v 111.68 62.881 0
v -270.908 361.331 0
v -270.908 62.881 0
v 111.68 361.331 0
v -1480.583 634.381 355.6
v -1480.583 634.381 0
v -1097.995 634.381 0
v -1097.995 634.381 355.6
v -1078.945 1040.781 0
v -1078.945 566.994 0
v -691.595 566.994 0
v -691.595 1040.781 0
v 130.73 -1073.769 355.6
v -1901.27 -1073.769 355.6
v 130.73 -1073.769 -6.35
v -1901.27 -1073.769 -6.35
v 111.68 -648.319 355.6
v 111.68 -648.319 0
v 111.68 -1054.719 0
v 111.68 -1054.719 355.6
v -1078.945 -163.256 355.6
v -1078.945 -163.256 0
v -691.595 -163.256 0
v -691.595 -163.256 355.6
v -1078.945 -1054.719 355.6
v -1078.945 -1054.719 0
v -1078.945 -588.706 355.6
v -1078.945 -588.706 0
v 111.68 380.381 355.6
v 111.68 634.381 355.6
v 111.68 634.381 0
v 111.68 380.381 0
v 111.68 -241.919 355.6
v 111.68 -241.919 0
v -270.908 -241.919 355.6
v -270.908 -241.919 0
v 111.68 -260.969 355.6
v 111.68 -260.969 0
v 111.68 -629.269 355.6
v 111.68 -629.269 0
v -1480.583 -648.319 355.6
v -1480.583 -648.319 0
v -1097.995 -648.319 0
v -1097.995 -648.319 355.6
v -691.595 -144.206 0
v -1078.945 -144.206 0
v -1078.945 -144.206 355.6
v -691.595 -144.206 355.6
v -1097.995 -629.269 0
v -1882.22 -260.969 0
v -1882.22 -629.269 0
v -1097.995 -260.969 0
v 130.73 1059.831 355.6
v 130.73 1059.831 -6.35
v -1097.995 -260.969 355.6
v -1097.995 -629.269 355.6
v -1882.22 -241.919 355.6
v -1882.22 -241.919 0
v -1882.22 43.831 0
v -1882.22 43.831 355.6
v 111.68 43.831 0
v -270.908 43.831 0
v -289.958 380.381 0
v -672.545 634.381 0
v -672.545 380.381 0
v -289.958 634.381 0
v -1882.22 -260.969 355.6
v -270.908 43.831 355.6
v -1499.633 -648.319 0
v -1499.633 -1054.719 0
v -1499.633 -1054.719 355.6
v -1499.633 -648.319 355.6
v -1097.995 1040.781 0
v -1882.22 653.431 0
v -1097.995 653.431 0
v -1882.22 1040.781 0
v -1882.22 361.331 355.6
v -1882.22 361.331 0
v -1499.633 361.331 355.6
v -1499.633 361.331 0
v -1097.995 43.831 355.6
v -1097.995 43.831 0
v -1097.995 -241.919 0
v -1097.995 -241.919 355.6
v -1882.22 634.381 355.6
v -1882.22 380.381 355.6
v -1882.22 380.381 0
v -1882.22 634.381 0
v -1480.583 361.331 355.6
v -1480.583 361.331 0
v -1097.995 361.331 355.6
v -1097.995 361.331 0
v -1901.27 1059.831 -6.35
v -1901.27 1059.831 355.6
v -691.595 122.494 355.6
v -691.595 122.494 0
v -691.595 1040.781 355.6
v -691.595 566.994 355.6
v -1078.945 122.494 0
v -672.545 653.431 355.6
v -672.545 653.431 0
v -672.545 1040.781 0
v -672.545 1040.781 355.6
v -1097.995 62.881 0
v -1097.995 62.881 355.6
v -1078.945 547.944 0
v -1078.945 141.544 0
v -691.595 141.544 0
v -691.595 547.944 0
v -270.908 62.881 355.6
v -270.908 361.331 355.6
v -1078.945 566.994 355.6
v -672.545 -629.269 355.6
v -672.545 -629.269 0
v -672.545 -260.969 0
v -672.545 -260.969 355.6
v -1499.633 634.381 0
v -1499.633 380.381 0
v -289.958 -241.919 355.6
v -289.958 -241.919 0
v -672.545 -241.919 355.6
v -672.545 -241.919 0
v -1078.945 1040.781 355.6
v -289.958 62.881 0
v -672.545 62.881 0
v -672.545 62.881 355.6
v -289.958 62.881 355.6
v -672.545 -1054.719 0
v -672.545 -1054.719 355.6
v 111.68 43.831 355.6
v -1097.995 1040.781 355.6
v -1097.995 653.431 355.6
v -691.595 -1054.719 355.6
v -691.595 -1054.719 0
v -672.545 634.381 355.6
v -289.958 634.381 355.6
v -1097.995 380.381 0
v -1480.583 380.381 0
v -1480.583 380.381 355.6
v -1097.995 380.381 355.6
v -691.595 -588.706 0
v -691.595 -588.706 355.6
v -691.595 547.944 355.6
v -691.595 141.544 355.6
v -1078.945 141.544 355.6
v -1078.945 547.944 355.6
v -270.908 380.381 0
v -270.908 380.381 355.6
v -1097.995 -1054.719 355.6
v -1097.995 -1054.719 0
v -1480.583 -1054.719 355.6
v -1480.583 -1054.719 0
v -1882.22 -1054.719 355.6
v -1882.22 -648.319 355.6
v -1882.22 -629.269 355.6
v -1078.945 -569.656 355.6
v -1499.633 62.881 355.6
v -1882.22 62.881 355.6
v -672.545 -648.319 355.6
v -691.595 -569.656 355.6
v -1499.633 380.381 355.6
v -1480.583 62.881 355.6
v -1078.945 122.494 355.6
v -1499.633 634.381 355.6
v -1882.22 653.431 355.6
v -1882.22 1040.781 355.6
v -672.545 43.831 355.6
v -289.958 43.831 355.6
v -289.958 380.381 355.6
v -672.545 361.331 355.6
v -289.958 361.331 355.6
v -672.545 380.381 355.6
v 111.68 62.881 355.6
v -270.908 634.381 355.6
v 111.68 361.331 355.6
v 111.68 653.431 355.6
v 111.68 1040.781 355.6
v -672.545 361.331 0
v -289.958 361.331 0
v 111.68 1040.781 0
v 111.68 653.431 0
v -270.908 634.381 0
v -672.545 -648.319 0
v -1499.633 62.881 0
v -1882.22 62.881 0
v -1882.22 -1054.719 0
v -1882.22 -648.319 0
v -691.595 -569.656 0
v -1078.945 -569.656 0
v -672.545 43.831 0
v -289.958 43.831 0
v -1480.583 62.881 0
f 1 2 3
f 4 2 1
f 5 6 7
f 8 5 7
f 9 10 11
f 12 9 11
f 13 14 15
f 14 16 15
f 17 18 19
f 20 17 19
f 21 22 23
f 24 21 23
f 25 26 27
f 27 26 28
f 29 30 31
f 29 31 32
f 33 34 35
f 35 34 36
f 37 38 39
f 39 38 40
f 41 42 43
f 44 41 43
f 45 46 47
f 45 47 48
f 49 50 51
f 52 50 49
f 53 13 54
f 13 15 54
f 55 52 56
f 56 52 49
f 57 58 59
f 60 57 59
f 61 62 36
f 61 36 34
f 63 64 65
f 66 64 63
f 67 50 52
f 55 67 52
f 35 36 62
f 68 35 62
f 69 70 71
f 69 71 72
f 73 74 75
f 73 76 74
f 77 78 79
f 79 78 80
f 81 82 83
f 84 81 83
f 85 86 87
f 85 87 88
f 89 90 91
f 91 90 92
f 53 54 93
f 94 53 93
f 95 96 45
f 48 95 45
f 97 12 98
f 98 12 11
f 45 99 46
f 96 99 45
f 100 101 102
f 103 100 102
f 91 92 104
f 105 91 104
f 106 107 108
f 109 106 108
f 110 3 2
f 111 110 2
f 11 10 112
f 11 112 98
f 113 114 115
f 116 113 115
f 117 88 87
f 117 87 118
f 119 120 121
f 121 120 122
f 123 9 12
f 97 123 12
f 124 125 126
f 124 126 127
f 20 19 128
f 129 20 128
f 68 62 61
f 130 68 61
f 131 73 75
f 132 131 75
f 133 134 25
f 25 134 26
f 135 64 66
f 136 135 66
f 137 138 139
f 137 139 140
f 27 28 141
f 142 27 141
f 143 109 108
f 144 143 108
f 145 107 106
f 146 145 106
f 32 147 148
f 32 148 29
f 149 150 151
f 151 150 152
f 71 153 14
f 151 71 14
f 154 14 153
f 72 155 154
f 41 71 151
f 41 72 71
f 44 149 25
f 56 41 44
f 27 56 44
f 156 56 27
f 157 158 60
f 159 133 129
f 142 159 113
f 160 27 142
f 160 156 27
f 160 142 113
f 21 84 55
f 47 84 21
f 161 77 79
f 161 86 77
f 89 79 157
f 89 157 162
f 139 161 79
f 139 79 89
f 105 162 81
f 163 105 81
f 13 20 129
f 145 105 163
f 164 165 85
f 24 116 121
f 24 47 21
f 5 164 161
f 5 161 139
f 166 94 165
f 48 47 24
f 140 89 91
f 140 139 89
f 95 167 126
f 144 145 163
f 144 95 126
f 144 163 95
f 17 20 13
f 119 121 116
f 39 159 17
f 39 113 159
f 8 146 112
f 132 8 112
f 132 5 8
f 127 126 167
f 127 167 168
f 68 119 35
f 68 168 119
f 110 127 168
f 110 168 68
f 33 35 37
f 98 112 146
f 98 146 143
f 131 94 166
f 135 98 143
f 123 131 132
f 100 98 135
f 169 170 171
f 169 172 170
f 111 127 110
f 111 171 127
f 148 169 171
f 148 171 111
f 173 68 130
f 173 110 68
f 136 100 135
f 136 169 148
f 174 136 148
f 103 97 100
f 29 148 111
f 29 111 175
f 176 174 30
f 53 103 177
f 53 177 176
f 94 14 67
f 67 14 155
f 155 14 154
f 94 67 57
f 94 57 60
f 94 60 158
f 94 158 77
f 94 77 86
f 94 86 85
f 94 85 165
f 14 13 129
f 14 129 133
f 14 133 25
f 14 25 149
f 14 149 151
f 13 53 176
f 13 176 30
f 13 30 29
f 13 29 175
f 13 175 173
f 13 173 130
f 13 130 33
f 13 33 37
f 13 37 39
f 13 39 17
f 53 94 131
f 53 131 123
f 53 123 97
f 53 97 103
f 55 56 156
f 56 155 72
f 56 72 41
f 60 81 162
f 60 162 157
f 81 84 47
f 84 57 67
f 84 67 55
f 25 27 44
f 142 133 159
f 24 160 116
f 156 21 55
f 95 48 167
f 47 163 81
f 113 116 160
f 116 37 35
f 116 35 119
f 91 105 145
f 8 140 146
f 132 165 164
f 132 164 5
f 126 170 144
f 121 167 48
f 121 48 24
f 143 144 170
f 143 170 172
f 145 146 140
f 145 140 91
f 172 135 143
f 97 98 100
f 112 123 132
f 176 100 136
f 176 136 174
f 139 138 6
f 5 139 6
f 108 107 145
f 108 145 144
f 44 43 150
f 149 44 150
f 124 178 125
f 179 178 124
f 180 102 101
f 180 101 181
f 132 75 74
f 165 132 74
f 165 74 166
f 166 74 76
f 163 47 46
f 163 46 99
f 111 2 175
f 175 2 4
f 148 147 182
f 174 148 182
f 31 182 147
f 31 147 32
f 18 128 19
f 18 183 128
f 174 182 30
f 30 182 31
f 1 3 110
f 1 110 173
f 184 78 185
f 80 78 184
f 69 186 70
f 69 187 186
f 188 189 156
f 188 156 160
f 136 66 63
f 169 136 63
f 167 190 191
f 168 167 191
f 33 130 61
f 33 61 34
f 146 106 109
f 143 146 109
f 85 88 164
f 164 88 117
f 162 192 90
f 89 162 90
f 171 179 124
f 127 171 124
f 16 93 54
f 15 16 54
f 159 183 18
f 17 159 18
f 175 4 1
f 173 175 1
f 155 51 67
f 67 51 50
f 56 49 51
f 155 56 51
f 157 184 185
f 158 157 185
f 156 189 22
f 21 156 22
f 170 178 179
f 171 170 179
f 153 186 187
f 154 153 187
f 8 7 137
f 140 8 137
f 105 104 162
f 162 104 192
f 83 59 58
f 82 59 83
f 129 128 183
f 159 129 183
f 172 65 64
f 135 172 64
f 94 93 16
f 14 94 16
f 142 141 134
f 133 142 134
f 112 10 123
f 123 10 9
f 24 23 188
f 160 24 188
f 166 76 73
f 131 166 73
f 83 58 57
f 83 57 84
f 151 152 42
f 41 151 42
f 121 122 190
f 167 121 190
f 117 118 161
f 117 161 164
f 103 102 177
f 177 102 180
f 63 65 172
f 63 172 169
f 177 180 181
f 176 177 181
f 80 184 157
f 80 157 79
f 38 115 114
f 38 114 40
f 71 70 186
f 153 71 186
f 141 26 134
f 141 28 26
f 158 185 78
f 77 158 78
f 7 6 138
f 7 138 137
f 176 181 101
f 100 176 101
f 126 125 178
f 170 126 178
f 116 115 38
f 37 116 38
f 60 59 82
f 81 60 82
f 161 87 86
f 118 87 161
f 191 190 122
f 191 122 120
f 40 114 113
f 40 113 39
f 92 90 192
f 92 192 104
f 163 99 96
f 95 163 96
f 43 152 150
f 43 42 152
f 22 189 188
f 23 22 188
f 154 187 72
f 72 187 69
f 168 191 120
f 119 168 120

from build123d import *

# Parameters (mm, degrees)
F0_W     = 784.225
F0_H     = 387.35
F0_W_2   = 382.5875
F0_H_2   = 406.4
F0_H_3   = 254
F0_W_3   = 387.35
F0_H_4   = 473.7870542765
F0_W_4   = 19.05
F0_H_5   = 19.05
F0_H_6   = 368.3
F0_H_7   = 298.45
F0_H_8   = 466.0129457235
F0_H_9   = 285.75
F0_H_10  = 266.7
F1_DEPTH = 6.35
F2_DEPTH = 355.6


with BuildPart() as f1:
    # F0 (on Top) → F1 (new body)
    with BuildSketch(Plane.XY):
        Polygon((-1882.2203393722, 1059.8308014154), (-1901.2703393722, 1059.8308014154), (-1901.2703393722, -1073.7691985846), (-1882.2203393722, -1073.7691985846), (-1882.2203393722, -1054.7191985846), (-1882.2203393722, -648.3191985846), (-1882.2203393722, -629.2691985846), (-1882.2203393722, -260.9691985846), (-1882.2203393722, -241.9191985846), (-1882.2203393722, 43.8308014154), (-1882.2203393722, 62.8808014154), (-1882.2203393722, 361.3308014154), (-1882.2203393722, 380.3808014154), (-1882.2203393722, 634.3808014154), (-1882.2203393722, 653.4308014154), (-1882.2203393722, 1040.7808014154), align=None)
        Polygon((-682.0703393722, 1059.8308014154), (-1882.2203393722, 1059.8308014154), (-1882.2203393722, 1040.7808014154), (-1097.9953393722, 1040.7808014154), (-1078.9453393722, 1040.7808014154), (-691.5953393722, 1040.7808014154), (-672.5453393722, 1040.7808014154), (111.6796606278, 1040.7808014154), (111.6796606278, 1059.8308014154), align=None)
        with Locations((-1490.1078393722, 847.1058014154)):
            Rectangle(F0_W, F0_H)
        Polygon((-1882.2203393722, -1054.7191985846), (-1882.2203393722, -1073.7691985846), (111.6796606278, -1073.7691985846), (111.6796606278, -1054.7191985846), (-672.5453393722, -1054.7191985846), (-691.5953393722, -1054.7191985846), (-1078.9453393722, -1054.7191985846), (-1097.9953393722, -1054.7191985846), (-1480.5828393722, -1054.7191985846), (-1499.6328393722, -1054.7191985846), align=None)
        Polygon((130.7296606278, 1059.8308014154), (111.6796606278, 1059.8308014154), (111.6796606278, 1040.7808014154), (111.6796606278, 653.4308014154), (111.6796606278, 634.3808014154), (111.6796606278, 380.3808014154), (111.6796606278, 361.3308014154), (111.6796606278, 62.8808014154), (111.6796606278, 43.8308014154), (111.6796606278, -241.9191985846), (111.6796606278, -260.9691985846), (111.6796606278, -629.2691985846), (111.6796606278, -648.3191985846), (111.6796606278, -1054.7191985846), (111.6796606278, -1073.7691985846), (130.7296606278, -1073.7691985846), align=None)
        Polygon((-1097.9953393722, 653.4308014154), (-1882.2203393722, 653.4308014154), (-1882.2203393722, 634.3808014154), (-1499.6328393722, 634.3808014154), (-1480.5828393722, 634.3808014154), (-1097.9953393722, 634.3808014154), align=None)
        Polygon((-1078.9453393722, 1040.7808014154), (-1097.9953393722, 1040.7808014154), (-1097.9953393722, 653.4308014154), (-1097.9953393722, 634.3808014154), (-1097.9953393722, 380.3808014154), (-1097.9953393722, 361.3308014154), (-1097.9953393722, 62.8808014154), (-1097.9953393722, 43.8308014154), (-1097.9953393722, -241.9191985846), (-1097.9953393722, -260.9691985846), (-1097.9953393722, -629.2691985846), (-1097.9953393722, -648.3191985846), (-1097.9953393722, -1054.7191985846), (-1078.9453393722, -1054.7191985846), (-1078.9453393722, -588.706252861), (-1078.9453393722, -569.656252861), (-1078.9453393722, -163.256252861), (-1078.9453393722, -144.206252861), (-1078.9453393722, 122.493747139), (-1078.9453393722, 141.543747139), (-1078.9453393722, 547.943747139), (-1078.9453393722, 566.993747139), align=None)
        with Locations((-1690.9265893722, -851.5191985846)):
            Rectangle(F0_W_2, F0_H_2)
        with Locations((-280.4328393722, 847.1058014154)):
            Rectangle(F0_W, F0_H)
        with Locations((-1690.9265893722, 507.3808014154)):
            Rectangle(F0_W_2, F0_H_3)
        with Locations((-885.2703393722, 803.8872742772)):
            Rectangle(F0_W_3, F0_H_4)
        with Locations((-280.4328393722, -851.5191985846)):
            Rectangle(F0_W, F0_H_2)
        Polygon((-1882.2203393722, -629.2691985846), (-1882.2203393722, -648.3191985846), (-1499.6328393722, -648.3191985846), (-1480.5828393722, -648.3191985846), (-1097.9953393722, -648.3191985846), (-1097.9953393722, -629.2691985846), align=None)
        with Locations((-1490.1078393722, -851.5191985846)):
            Rectangle(F0_W_4, F0_H_2)
        Polygon((111.6796606278, 634.3808014154), (111.6796606278, 653.4308014154), (-672.5453393722, 653.4308014154), (-672.5453393722, 634.3808014154), (-289.9578393722, 634.3808014154), (-270.9078393722, 634.3808014154), align=None)
        Polygon((-672.5453393722, 653.4308014154), (-672.5453393722, 1040.7808014154), (-691.5953393722, 1040.7808014154), (-691.5953393722, 566.993747139), (-691.5953393722, 547.943747139), (-691.5953393722, 141.543747139), (-691.5953393722, 122.493747139), (-691.5953393722, -144.206252861), (-691.5953393722, -163.256252861), (-691.5953393722, -569.656252861), (-691.5953393722, -588.706252861), (-691.5953393722, -1054.7191985846), (-672.5453393722, -1054.7191985846), (-672.5453393722, -648.3191985846), (-672.5453393722, -629.2691985846), (-672.5453393722, -260.9691985846), (-672.5453393722, -241.9191985846), (-672.5453393722, 43.8308014154), (-672.5453393722, 62.8808014154), (-672.5453393722, 361.3308014154), (-672.5453393722, 380.3808014154), (-672.5453393722, 634.3808014154), align=None)
        with Locations((-1690.9265893722, 370.8558014154)):
            Rectangle(F0_W_2, F0_H_5)
        with Locations((-1490.1078393722, 507.3808014154)):
            Rectangle(F0_W_4, F0_H_3)
        with Locations((-1289.2890893722, 507.3808014154)):
            Rectangle(F0_W_2, F0_H_3)
        with Locations((-885.2703393722, 557.468747139)):
            Rectangle(F0_W_3, F0_H_5)
        with Locations((-280.4328393722, -638.7941985846)):
            Rectangle(F0_W, F0_H_5)
        with Locations((-1490.1078393722, -445.1191985846)):
            Rectangle(F0_W, F0_H_6)
        with Locations((-1289.2890893722, -851.5191985846)):
            Rectangle(F0_W_2, F0_H_2)
        with Locations((-79.6140893722, 507.3808014154)):
            Rectangle(F0_W_2, F0_H_3)
        with Locations((-1690.9265893722, 212.1058014154)):
            Rectangle(F0_W_2, F0_H_7)
        with Locations((-1490.1078393722, 370.8558014154)):
            Rectangle(F0_W_4, F0_H_5)
        with Locations((-1289.2890893722, 370.8558014154)):
            Rectangle(F0_W_2, F0_H_5)
        with Locations((-885.2703393722, 344.743747139)):
            Rectangle(F0_W_3, F0_H_2)
        with Locations((-280.4328393722, -445.1191985846)):
            Rectangle(F0_W, F0_H_6)
        with Locations((-885.2703393722, -821.7127257228)):
            Rectangle(F0_W_3, F0_H_8)
        with Locations((-1490.1078393722, -251.4441985846)):
            Rectangle(F0_W, F0_H_5)
        with Locations((-79.6140893722, 370.8558014154)):
            Rectangle(F0_W_2, F0_H_5)
        with Locations((-280.4328393722, 507.3808014154)):
            Rectangle(F0_W_4, F0_H_3)
        with Locations((-481.2515893722, 507.3808014154)):
            Rectangle(F0_W_2, F0_H_3)
        Polygon((-1499.6328393722, 62.8808014154), (-1882.2203393722, 62.8808014154), (-1882.2203393722, 43.8308014154), (-1097.9953393722, 43.8308014154), (-1097.9953393722, 62.8808014154), (-1480.5828393722, 62.8808014154), align=None)
        with Locations((-1490.1078393722, 212.1058014154)):
            Rectangle(F0_W_4, F0_H_7)
        with Locations((-1289.2890893722, 212.1058014154)):
            Rectangle(F0_W_2, F0_H_7)
        with Locations((-885.2703393722, 132.018747139)):
            Rectangle(F0_W_3, F0_H_5)
        Polygon((-672.5453393722, -260.9691985846), (111.6796606278, -260.9691985846), (111.6796606278, -241.9191985846), (-270.9078393722, -241.9191985846), (-289.9578393722, -241.9191985846), (-672.5453393722, -241.9191985846), align=None)
        with Locations((-885.2703393722, -579.181252861)):
            Rectangle(F0_W_3, F0_H_5)
        with Locations((-1490.1078393722, -99.0441985846)):
            Rectangle(F0_W, F0_H_9)
        with Locations((-79.6140893722, 212.1058014154)):
            Rectangle(F0_W_2, F0_H_7)
        with Locations((-280.4328393722, 370.8558014154)):
            Rectangle(F0_W_4, F0_H_5)
        with Locations((-481.2515893722, 370.8558014154)):
            Rectangle(F0_W_2, F0_H_5)
        with Locations((-885.2703393722, -10.856252861)):
            Rectangle(F0_W_3, F0_H_10)
        with Locations((-79.6140893722, -99.0441985846)):
            Rectangle(F0_W_2, F0_H_9)
        with Locations((-885.2703393722, -366.456252861)):
            Rectangle(F0_W_3, F0_H_2)
        with Locations((-79.6140893722, 53.3558014154)):
            Rectangle(F0_W_2, F0_H_5)
        with Locations((-280.4328393722, 212.1058014154)):
            Rectangle(F0_W_4, F0_H_7)
        with Locations((-481.2515893722, 212.1058014154)):
            Rectangle(F0_W_2, F0_H_7)
        with Locations((-885.2703393722, -153.731252861)):
            Rectangle(F0_W_3, F0_H_5)
        with Locations((-280.4328393722, -99.0441985846)):
            Rectangle(F0_W_4, F0_H_9)
        with Locations((-481.2515893722, -99.0441985846)):
            Rectangle(F0_W_2, F0_H_9)
        with Locations((-280.4328393722, 53.3558014154)):
            Rectangle(F0_W_4, F0_H_5)
        with Locations((-481.2515893722, 53.3558014154)):
            Rectangle(F0_W_2, F0_H_5)
    extrude(amount=-F1_DEPTH)

    # F0 (on Top) → F2 (join)
    with BuildSketch(Plane.XY):
        Polygon((-1882.2203393722, 1059.8308014154), (-1901.2703393722, 1059.8308014154), (-1901.2703393722, -1073.7691985846), (-1882.2203393722, -1073.7691985846), (-1882.2203393722, -1054.7191985846), (-1882.2203393722, -648.3191985846), (-1882.2203393722, -629.2691985846), (-1882.2203393722, -260.9691985846), (-1882.2203393722, -241.9191985846), (-1882.2203393722, 43.8308014154), (-1882.2203393722, 62.8808014154), (-1882.2203393722, 361.3308014154), (-1882.2203393722, 380.3808014154), (-1882.2203393722, 634.3808014154), (-1882.2203393722, 653.4308014154), (-1882.2203393722, 1040.7808014154), align=None)
        Polygon((-682.0703393722, 1059.8308014154), (-1882.2203393722, 1059.8308014154), (-1882.2203393722, 1040.7808014154), (-1097.9953393722, 1040.7808014154), (-1078.9453393722, 1040.7808014154), (-691.5953393722, 1040.7808014154), (-672.5453393722, 1040.7808014154), (111.6796606278, 1040.7808014154), (111.6796606278, 1059.8308014154), align=None)
        Polygon((-1882.2203393722, -1054.7191985846), (-1882.2203393722, -1073.7691985846), (111.6796606278, -1073.7691985846), (111.6796606278, -1054.7191985846), (-672.5453393722, -1054.7191985846), (-691.5953393722, -1054.7191985846), (-1078.9453393722, -1054.7191985846), (-1097.9953393722, -1054.7191985846), (-1480.5828393722, -1054.7191985846), (-1499.6328393722, -1054.7191985846), align=None)
        Polygon((130.7296606278, 1059.8308014154), (111.6796606278, 1059.8308014154), (111.6796606278, 1040.7808014154), (111.6796606278, 653.4308014154), (111.6796606278, 634.3808014154), (111.6796606278, 380.3808014154), (111.6796606278, 361.3308014154), (111.6796606278, 62.8808014154), (111.6796606278, 43.8308014154), (111.6796606278, -241.9191985846), (111.6796606278, -260.9691985846), (111.6796606278, -629.2691985846), (111.6796606278, -648.3191985846), (111.6796606278, -1054.7191985846), (111.6796606278, -1073.7691985846), (130.7296606278, -1073.7691985846), align=None)
        Polygon((-1097.9953393722, 653.4308014154), (-1882.2203393722, 653.4308014154), (-1882.2203393722, 634.3808014154), (-1499.6328393722, 634.3808014154), (-1480.5828393722, 634.3808014154), (-1097.9953393722, 634.3808014154), align=None)
        Polygon((-1078.9453393722, 1040.7808014154), (-1097.9953393722, 1040.7808014154), (-1097.9953393722, 653.4308014154), (-1097.9953393722, 634.3808014154), (-1097.9953393722, 380.3808014154), (-1097.9953393722, 361.3308014154), (-1097.9953393722, 62.8808014154), (-1097.9953393722, 43.8308014154), (-1097.9953393722, -241.9191985846), (-1097.9953393722, -260.9691985846), (-1097.9953393722, -629.2691985846), (-1097.9953393722, -648.3191985846), (-1097.9953393722, -1054.7191985846), (-1078.9453393722, -1054.7191985846), (-1078.9453393722, -588.706252861), (-1078.9453393722, -569.656252861), (-1078.9453393722, -163.256252861), (-1078.9453393722, -144.206252861), (-1078.9453393722, 122.493747139), (-1078.9453393722, 141.543747139), (-1078.9453393722, 547.943747139), (-1078.9453393722, 566.993747139), align=None)
        Polygon((-1882.2203393722, -629.2691985846), (-1882.2203393722, -648.3191985846), (-1499.6328393722, -648.3191985846), (-1480.5828393722, -648.3191985846), (-1097.9953393722, -648.3191985846), (-1097.9953393722, -629.2691985846), align=None)
        with Locations((-1490.1078393722, -851.5191985846)):
            Rectangle(F0_W_4, F0_H_2)
        Polygon((111.6796606278, 634.3808014154), (111.6796606278, 653.4308014154), (-672.5453393722, 653.4308014154), (-672.5453393722, 634.3808014154), (-289.9578393722, 634.3808014154), (-270.9078393722, 634.3808014154), align=None)
        Polygon((-672.5453393722, 653.4308014154), (-672.5453393722, 1040.7808014154), (-691.5953393722, 1040.7808014154), (-691.5953393722, 566.993747139), (-691.5953393722, 547.943747139), (-691.5953393722, 141.543747139), (-691.5953393722, 122.493747139), (-691.5953393722, -144.206252861), (-691.5953393722, -163.256252861), (-691.5953393722, -569.656252861), (-691.5953393722, -588.706252861), (-691.5953393722, -1054.7191985846), (-672.5453393722, -1054.7191985846), (-672.5453393722, -648.3191985846), (-672.5453393722, -629.2691985846), (-672.5453393722, -260.9691985846), (-672.5453393722, -241.9191985846), (-672.5453393722, 43.8308014154), (-672.5453393722, 62.8808014154), (-672.5453393722, 361.3308014154), (-672.5453393722, 380.3808014154), (-672.5453393722, 634.3808014154), align=None)
        with Locations((-1690.9265893722, 370.8558014154)):
            Rectangle(F0_W_2, F0_H_5)
        with Locations((-1490.1078393722, 507.3808014154)):
            Rectangle(F0_W_4, F0_H_3)
        with Locations((-885.2703393722, 557.468747139)):
            Rectangle(F0_W_3, F0_H_5)
        with Locations((-280.4328393722, -638.7941985846)):
            Rectangle(F0_W, F0_H_5)
        with Locations((-1490.1078393722, 370.8558014154)):
            Rectangle(F0_W_4, F0_H_5)
        with Locations((-1289.2890893722, 370.8558014154)):
            Rectangle(F0_W_2, F0_H_5)
        with Locations((-1490.1078393722, -251.4441985846)):
            Rectangle(F0_W, F0_H_5)
        with Locations((-79.6140893722, 370.8558014154)):
            Rectangle(F0_W_2, F0_H_5)
        with Locations((-280.4328393722, 507.3808014154)):
            Rectangle(F0_W_4, F0_H_3)
        Polygon((-1499.6328393722, 62.8808014154), (-1882.2203393722, 62.8808014154), (-1882.2203393722, 43.8308014154), (-1097.9953393722, 43.8308014154), (-1097.9953393722, 62.8808014154), (-1480.5828393722, 62.8808014154), align=None)
        with Locations((-1490.1078393722, 212.1058014154)):
            Rectangle(F0_W_4, F0_H_7)
        with Locations((-885.2703393722, 132.018747139)):
            Rectangle(F0_W_3, F0_H_5)
        Polygon((-672.5453393722, -260.9691985846), (111.6796606278, -260.9691985846), (111.6796606278, -241.9191985846), (-270.9078393722, -241.9191985846), (-289.9578393722, -241.9191985846), (-672.5453393722, -241.9191985846), align=None)
        with Locations((-885.2703393722, -579.181252861)):
            Rectangle(F0_W_3, F0_H_5)
        with Locations((-280.4328393722, 370.8558014154)):
            Rectangle(F0_W_4, F0_H_5)
        with Locations((-481.2515893722, 370.8558014154)):
            Rectangle(F0_W_2, F0_H_5)
        with Locations((-79.6140893722, 53.3558014154)):
            Rectangle(F0_W_2, F0_H_5)
        with Locations((-280.4328393722, 212.1058014154)):
            Rectangle(F0_W_4, F0_H_7)
        with Locations((-885.2703393722, -153.731252861)):
            Rectangle(F0_W_3, F0_H_5)
        with Locations((-280.4328393722, -99.0441985846)):
            Rectangle(F0_W_4, F0_H_9)
        with Locations((-280.4328393722, 53.3558014154)):
            Rectangle(F0_W_4, F0_H_5)
        with Locations((-481.2515893722, 53.3558014154)):
            Rectangle(F0_W_2, F0_H_5)
    extrude(amount=F2_DEPTH)


solid = f1.part
